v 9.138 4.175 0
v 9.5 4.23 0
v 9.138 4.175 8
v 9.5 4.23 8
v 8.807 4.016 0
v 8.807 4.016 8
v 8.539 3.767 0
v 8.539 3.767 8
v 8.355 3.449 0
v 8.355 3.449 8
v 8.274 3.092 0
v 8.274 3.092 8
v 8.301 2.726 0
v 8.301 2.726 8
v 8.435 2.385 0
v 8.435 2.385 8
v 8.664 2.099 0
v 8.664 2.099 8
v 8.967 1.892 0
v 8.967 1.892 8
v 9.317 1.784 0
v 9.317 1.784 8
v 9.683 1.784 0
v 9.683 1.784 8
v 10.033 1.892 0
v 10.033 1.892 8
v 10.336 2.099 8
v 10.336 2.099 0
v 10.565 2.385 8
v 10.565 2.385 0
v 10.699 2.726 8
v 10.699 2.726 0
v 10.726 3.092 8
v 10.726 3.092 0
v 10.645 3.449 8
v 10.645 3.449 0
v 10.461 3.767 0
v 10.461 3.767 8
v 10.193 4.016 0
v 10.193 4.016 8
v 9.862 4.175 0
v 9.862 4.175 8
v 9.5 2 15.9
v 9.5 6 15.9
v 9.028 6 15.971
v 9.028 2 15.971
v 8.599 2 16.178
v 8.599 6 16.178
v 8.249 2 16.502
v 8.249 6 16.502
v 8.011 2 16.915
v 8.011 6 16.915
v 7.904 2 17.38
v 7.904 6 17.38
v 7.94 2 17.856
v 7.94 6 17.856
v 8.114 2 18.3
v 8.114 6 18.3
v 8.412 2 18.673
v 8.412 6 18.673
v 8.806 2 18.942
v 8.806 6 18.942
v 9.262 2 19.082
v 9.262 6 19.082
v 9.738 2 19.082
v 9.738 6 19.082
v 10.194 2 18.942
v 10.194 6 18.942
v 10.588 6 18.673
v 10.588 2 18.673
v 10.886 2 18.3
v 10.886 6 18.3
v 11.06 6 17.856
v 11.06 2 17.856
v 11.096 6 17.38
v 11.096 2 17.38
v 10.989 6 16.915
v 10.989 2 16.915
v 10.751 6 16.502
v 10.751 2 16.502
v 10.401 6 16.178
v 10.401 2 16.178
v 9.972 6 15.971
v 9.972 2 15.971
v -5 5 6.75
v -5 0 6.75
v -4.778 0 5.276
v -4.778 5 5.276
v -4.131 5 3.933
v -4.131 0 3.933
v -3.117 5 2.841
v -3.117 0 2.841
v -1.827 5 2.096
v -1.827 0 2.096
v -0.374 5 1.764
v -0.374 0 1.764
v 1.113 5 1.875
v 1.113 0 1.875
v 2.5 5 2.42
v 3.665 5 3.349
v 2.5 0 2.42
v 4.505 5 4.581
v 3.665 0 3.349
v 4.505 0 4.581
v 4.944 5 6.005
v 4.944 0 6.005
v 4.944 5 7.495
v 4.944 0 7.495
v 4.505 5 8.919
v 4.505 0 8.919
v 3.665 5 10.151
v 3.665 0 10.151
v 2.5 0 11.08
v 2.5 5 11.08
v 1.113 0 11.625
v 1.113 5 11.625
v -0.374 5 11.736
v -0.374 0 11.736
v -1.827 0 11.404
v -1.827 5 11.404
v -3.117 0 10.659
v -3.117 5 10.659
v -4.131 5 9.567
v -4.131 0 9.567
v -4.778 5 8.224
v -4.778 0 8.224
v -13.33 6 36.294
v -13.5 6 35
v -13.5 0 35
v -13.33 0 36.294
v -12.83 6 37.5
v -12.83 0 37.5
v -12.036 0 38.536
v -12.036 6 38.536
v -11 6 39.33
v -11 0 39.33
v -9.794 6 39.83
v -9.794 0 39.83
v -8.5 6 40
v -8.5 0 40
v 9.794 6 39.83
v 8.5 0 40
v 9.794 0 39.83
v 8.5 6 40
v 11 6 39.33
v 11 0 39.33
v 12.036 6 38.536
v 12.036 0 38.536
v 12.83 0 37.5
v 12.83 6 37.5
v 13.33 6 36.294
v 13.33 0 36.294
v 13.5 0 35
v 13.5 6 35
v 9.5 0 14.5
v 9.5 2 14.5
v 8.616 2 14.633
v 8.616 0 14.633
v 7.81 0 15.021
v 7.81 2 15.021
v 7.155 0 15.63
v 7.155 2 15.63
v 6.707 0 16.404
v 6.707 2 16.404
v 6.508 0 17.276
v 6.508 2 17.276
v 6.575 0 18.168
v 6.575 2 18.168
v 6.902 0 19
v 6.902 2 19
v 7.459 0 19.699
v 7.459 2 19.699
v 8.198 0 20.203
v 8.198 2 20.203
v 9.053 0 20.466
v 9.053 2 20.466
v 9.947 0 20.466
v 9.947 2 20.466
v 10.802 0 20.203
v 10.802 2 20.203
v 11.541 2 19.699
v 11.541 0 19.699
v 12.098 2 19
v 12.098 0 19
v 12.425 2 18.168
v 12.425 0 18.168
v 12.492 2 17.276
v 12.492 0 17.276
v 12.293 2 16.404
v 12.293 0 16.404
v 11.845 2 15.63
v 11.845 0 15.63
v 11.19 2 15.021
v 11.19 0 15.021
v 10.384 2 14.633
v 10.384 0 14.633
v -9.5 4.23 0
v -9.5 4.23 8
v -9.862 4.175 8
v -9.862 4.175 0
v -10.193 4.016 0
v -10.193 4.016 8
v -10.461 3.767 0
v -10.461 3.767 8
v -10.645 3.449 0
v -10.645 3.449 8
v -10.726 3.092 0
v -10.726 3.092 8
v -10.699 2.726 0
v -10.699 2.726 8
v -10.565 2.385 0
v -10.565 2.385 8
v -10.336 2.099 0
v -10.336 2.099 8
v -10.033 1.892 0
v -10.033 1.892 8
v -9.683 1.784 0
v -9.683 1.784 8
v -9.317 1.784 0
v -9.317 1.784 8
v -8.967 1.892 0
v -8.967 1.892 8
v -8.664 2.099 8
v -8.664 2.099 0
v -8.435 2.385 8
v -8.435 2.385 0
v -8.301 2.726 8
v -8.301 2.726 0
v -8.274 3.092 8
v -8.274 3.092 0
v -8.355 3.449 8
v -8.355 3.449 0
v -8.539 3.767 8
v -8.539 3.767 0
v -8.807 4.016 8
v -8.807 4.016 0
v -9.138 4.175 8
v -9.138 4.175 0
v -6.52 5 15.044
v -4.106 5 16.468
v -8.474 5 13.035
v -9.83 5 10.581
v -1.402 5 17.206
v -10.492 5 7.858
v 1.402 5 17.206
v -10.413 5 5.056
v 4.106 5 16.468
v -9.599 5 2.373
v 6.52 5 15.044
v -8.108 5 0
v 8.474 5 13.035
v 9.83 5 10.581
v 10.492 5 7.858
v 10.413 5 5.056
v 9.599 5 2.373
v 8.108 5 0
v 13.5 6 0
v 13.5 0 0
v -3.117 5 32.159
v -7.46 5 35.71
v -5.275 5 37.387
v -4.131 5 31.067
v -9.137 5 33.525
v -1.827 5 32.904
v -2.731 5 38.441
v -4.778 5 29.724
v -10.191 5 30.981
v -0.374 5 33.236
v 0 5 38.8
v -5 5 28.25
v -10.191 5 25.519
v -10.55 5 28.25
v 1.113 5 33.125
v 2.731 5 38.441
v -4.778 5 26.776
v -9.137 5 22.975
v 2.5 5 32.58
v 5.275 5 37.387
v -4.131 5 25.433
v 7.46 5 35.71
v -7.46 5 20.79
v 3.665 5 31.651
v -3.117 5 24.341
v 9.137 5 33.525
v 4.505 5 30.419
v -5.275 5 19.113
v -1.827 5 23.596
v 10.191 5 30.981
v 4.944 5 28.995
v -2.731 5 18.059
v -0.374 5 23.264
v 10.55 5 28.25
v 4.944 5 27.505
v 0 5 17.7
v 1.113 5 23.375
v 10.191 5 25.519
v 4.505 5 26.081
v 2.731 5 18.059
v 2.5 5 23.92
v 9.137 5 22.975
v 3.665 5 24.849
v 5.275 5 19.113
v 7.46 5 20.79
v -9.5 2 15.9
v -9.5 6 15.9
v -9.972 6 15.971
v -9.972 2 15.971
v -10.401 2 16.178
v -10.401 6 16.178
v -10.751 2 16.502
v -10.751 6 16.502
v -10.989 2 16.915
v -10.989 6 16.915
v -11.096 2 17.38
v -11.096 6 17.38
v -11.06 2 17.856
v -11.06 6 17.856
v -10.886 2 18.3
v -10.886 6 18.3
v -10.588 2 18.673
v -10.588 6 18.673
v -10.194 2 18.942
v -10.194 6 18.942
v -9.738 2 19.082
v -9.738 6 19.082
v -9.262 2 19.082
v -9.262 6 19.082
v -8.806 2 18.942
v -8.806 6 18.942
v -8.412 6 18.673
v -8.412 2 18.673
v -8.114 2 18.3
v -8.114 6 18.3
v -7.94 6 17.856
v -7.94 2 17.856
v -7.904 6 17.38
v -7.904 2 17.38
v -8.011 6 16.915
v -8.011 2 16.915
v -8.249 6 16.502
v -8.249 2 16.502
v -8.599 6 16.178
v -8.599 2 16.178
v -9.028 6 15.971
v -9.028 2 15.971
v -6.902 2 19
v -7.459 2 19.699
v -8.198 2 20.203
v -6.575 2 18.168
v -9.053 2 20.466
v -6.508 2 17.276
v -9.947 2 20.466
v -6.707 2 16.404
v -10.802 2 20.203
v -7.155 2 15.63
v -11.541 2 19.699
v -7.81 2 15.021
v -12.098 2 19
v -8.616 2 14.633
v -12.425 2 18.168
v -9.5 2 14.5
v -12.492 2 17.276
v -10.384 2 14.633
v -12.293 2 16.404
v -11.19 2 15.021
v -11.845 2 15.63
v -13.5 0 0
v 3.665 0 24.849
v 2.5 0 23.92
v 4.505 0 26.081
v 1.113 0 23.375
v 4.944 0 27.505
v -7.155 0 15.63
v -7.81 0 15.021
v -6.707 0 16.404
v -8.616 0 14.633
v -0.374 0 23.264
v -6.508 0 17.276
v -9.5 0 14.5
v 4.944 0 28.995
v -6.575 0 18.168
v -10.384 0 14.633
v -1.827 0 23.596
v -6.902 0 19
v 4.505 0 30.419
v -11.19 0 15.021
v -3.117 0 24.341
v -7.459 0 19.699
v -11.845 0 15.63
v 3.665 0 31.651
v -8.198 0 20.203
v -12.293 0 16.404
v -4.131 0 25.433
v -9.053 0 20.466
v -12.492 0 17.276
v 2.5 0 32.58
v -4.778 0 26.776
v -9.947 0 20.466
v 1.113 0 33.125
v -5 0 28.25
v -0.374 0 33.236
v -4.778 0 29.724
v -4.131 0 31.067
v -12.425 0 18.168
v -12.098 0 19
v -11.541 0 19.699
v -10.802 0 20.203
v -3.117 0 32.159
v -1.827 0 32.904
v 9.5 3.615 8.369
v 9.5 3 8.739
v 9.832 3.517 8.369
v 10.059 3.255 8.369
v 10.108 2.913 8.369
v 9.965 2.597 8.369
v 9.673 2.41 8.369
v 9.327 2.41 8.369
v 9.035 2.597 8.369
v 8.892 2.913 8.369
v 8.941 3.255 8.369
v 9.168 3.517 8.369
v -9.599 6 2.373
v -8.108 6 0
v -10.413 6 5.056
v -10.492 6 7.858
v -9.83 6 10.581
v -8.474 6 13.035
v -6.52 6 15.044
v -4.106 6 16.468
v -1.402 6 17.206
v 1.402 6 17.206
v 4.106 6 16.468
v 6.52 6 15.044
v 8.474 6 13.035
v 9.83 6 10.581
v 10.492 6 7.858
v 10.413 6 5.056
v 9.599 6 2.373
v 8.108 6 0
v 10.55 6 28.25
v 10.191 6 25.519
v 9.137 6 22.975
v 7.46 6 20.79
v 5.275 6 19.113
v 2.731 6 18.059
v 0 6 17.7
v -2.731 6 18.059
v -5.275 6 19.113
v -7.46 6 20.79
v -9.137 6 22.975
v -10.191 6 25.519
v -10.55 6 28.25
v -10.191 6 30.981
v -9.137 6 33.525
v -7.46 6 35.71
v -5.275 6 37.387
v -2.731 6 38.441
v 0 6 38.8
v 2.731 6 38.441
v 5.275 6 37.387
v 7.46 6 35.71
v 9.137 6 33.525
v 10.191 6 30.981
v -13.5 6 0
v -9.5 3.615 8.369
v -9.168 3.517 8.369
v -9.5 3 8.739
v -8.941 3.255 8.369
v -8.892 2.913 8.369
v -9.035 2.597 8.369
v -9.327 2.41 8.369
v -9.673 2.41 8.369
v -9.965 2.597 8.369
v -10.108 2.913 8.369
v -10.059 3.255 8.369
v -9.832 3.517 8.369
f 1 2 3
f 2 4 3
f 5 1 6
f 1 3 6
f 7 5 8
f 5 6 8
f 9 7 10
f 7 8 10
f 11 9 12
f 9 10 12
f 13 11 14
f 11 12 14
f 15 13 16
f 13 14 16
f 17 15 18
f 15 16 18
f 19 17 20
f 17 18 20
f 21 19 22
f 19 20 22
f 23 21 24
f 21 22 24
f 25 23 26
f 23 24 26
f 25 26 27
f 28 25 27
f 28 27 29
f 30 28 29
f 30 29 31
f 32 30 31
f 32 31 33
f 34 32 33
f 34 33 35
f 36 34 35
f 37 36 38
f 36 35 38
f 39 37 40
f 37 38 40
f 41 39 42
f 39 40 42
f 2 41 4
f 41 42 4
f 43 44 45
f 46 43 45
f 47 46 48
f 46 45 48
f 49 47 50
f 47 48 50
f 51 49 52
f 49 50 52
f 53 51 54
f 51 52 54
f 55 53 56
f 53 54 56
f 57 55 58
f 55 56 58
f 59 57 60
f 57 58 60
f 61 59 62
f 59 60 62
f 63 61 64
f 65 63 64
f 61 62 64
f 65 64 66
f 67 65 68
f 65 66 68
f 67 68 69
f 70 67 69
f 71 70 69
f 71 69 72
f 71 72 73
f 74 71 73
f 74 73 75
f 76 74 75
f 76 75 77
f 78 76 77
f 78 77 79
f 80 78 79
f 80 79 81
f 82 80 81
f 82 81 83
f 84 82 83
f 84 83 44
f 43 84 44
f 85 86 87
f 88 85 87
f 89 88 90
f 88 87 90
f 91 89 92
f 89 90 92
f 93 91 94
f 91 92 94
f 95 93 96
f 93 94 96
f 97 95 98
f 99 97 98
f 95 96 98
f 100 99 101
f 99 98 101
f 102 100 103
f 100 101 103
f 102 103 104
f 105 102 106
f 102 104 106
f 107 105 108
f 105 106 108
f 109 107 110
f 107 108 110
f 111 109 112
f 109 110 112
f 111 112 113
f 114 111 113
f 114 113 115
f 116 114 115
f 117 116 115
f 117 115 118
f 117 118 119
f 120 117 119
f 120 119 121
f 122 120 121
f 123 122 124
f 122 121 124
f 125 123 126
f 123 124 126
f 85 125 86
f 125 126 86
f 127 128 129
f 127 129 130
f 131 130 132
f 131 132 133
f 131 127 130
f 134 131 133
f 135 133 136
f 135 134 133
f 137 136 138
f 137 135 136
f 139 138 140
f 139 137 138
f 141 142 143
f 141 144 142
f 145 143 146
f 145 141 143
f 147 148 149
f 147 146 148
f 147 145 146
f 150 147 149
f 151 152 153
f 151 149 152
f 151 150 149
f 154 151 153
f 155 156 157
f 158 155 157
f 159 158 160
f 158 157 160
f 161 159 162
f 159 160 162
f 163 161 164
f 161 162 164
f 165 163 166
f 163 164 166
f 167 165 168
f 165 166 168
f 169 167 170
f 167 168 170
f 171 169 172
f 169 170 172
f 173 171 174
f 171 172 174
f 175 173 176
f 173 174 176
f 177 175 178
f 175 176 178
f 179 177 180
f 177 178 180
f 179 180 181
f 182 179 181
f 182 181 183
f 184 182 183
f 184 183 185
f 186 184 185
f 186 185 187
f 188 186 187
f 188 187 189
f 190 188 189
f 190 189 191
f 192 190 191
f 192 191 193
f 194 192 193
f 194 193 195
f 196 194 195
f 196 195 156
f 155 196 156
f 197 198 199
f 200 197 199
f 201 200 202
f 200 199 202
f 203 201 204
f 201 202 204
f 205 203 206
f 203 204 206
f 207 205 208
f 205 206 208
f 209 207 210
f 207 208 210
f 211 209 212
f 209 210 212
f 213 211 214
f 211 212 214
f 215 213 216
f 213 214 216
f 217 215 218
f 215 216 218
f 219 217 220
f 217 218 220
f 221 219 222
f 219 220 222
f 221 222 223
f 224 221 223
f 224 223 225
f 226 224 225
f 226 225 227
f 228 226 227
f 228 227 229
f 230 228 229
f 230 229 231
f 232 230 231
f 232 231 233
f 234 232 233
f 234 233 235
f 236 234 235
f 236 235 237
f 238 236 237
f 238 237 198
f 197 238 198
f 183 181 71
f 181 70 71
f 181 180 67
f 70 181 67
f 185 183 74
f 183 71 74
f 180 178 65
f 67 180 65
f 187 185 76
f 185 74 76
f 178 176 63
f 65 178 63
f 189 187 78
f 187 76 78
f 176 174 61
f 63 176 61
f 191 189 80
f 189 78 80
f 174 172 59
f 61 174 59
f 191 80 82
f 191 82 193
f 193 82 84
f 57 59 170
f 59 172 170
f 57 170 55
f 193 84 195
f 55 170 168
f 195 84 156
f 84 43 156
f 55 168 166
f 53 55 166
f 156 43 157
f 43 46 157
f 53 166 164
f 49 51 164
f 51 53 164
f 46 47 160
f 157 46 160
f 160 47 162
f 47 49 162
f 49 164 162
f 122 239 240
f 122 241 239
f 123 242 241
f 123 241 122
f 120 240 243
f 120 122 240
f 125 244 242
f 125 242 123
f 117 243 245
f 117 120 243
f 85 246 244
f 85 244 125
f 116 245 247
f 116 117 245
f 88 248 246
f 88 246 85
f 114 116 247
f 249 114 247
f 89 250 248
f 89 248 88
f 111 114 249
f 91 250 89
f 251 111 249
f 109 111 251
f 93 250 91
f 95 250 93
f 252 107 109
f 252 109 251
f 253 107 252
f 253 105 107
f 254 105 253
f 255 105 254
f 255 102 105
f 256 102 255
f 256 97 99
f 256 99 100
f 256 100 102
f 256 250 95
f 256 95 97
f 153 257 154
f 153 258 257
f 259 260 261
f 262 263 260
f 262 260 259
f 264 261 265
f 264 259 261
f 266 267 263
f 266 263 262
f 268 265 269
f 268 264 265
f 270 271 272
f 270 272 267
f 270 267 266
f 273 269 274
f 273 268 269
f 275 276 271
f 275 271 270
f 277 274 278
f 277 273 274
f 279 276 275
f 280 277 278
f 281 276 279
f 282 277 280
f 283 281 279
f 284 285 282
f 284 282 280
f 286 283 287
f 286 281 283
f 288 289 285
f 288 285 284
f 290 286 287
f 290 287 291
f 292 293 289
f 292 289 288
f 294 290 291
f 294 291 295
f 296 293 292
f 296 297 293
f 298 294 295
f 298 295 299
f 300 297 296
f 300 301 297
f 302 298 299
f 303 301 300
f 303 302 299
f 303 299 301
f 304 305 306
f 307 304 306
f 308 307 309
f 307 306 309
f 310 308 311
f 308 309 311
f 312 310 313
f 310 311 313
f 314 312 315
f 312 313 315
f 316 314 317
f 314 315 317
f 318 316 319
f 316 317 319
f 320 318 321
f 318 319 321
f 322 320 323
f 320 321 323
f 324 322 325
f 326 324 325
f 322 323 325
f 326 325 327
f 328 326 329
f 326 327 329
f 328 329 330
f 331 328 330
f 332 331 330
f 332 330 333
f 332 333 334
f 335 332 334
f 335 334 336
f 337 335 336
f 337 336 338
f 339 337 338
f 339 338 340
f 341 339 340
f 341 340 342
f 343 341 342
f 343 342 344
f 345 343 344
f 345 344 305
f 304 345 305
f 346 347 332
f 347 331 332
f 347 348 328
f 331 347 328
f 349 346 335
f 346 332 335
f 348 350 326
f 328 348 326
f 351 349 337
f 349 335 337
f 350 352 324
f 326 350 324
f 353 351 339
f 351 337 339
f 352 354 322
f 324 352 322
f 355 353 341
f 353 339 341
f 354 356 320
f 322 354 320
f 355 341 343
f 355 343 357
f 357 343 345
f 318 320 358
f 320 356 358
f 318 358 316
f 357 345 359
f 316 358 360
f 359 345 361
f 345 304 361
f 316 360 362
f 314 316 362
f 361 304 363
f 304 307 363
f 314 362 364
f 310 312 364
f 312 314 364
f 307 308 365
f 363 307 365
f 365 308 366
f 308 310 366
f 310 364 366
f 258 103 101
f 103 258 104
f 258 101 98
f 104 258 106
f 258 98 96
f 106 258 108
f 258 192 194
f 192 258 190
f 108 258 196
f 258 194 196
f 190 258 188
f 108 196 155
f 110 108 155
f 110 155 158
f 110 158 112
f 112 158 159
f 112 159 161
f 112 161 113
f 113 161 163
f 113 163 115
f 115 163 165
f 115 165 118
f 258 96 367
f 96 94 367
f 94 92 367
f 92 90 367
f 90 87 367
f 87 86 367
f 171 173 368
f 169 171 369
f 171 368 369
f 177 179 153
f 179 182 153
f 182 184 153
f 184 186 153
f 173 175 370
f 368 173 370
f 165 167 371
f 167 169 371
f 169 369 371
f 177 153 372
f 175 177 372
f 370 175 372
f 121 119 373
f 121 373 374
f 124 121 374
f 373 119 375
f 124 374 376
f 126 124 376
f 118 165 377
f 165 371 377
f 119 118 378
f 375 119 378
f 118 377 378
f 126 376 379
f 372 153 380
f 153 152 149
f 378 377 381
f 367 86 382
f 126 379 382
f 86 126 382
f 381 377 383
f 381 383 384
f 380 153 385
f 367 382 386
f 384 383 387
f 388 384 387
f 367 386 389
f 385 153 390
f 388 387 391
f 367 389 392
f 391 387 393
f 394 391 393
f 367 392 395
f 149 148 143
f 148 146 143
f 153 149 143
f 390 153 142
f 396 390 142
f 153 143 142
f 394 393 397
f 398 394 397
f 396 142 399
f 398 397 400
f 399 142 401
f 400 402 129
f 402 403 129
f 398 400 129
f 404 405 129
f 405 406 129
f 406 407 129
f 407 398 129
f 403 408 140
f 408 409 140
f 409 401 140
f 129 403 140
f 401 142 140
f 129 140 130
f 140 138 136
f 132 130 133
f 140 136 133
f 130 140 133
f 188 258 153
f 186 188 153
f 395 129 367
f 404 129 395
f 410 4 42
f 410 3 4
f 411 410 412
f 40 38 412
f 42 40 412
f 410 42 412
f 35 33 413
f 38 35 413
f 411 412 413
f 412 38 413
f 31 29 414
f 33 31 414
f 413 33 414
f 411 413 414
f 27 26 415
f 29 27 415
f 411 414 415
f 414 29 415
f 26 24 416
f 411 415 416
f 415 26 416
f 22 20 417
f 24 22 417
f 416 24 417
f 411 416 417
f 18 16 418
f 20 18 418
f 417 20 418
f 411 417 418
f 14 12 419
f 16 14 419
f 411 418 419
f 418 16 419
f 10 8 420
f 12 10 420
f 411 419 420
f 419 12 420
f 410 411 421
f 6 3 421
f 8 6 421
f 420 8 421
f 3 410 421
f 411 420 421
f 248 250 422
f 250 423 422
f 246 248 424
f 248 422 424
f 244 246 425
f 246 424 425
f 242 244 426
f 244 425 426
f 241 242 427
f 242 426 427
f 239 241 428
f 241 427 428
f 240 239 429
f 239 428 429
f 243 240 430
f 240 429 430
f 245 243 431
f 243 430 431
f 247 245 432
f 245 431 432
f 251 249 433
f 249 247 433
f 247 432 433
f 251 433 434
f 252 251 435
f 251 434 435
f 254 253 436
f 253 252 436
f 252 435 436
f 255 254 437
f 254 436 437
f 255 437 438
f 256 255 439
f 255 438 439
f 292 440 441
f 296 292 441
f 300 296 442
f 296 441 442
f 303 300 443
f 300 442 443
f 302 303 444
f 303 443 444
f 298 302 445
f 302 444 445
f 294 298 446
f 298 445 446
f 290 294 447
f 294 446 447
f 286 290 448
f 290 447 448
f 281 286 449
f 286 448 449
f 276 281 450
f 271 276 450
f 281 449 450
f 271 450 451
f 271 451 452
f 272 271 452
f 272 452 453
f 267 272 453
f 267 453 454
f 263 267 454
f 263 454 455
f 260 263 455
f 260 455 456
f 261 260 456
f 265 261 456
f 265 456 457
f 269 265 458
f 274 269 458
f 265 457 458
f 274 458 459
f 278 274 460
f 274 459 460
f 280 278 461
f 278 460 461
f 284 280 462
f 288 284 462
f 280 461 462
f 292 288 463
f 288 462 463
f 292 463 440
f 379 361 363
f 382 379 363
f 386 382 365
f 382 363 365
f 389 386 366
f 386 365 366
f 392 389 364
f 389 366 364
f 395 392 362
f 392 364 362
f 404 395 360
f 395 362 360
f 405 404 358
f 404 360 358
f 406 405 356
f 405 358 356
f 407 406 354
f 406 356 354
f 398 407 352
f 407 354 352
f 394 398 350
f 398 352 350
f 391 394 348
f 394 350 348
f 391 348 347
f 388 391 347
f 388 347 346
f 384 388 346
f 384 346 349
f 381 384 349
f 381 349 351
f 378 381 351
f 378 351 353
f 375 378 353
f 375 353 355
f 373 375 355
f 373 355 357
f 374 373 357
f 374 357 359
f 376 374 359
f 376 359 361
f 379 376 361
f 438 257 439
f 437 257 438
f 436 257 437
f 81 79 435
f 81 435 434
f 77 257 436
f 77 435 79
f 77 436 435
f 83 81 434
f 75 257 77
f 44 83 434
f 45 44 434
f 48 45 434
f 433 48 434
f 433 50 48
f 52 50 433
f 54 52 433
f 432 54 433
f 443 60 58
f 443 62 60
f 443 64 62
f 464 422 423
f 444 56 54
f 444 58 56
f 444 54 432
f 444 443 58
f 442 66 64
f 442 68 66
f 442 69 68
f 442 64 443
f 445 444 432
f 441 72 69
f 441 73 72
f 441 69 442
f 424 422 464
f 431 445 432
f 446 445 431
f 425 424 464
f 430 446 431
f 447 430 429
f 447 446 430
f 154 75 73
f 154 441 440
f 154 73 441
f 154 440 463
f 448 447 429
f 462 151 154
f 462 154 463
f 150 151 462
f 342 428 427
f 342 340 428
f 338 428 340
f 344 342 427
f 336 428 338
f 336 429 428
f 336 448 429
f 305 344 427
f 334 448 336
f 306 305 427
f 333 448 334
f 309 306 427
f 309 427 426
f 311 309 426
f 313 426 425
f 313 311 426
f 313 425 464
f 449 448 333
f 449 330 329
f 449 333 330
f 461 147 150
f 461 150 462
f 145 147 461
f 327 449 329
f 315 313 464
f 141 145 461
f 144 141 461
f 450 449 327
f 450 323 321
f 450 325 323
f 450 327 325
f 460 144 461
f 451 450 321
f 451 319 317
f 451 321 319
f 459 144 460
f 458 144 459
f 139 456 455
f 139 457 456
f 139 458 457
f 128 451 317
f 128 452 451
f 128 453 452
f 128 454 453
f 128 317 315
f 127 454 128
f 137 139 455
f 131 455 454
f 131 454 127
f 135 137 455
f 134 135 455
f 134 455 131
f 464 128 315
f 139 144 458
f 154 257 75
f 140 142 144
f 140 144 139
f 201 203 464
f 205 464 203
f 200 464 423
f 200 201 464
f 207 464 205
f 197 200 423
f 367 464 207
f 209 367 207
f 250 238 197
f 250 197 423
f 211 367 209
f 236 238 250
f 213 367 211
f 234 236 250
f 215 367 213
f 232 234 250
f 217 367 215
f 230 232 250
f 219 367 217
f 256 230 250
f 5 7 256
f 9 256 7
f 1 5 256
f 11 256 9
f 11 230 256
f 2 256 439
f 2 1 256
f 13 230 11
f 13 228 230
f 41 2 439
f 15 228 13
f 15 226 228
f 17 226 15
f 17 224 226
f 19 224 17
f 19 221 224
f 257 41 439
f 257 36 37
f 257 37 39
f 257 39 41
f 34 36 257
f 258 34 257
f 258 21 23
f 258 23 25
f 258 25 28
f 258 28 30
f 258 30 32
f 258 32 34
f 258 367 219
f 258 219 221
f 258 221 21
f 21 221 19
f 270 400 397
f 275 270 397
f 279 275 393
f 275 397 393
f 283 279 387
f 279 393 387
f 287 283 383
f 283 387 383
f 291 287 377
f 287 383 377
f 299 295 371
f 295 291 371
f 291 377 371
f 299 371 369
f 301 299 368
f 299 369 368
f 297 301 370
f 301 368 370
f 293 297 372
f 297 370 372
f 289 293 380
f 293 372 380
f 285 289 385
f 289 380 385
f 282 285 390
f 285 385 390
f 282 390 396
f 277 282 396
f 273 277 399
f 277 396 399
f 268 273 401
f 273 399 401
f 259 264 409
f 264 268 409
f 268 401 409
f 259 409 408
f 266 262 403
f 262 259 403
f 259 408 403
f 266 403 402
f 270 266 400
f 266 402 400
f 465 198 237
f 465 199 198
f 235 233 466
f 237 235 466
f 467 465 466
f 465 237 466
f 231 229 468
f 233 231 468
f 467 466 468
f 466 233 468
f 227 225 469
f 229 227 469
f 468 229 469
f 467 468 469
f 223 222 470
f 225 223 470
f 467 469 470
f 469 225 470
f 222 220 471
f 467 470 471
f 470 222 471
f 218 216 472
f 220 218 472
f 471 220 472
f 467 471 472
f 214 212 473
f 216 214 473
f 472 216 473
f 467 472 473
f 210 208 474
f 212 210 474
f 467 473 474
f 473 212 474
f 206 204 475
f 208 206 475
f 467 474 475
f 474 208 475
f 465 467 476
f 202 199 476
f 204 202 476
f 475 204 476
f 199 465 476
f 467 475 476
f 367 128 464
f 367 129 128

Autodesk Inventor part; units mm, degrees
ref_plane "YZ Plane" through (0, 0, 0) normal (1, 0, 0) x (0, 1, 0)
ref_plane "XZ Plane" through (0, 0, 0) normal (0, 1, 0) x (-1, 0, 0)
ref_plane "XY Plane" through (0, 0, 0) normal (0, 0, 1) x (1, 0, 0)
sketch "Skizze1" plane through (0, 0, 0) normal (0, 1, 0) x (-1, 0, 0)
  line L0 (13.5, 0) -> (-13.5, 0)
  line L1 (-13.5, 0) -> (-13.5, 40)
  line L2 (-13.5, 40) -> (13.5, 40)
  line L3 (13.5, 40) -> (13.5, 0)
  line L4 (0, -12.8) -> (0, 48.8) projected
  circle A0 centre (0, 6.75) radius 5
  circle A1 centre (0, 28.25) radius 5
  circle A2 centre (0, 28.25) radius 10.75 construction
  circle A3 centre (0, 6.75) radius 10.75 construction
  line L5 (0, 6.75) -> (0, -4) construction
  point P0 (0, 0)
  dimension "d4" = 21.5
  dimension "d0" = 27
  dimension "d1" = 10
  dimension "d2" = 10
  dimension "d3" = 21.5
  dimension "d8" = 4
  dimension "d35" = 40
extrude "Extrusion1" add sketch "Skizze1" along normal blind 6 contours L0 L4 A0 A1 L2 L3 | L0 L1 L2 L4 A1 A0
sketch "Skizze2" plane through (13.5, 0, 0) normal (0, 0, -1) x (-1, 0, 0)
  line L0 (0, 0) -> (27, 0) projected
  line L1 (0, 6) -> (27, 6) projected
  line L2 (25.041, 3) -> (0, 3) construction
  line L3 (13.5, 0) -> (13.5, 6) construction
  line L4 (27, 0) -> (27, 6) projected
  line L5 (0, 0) -> (0, 6) projected
  point P0 (23, 3)
  point P1 (4, 3)
  dimension "d68" = 9.5
hole "Bohrung1" at (-9.5, 3, 0) at (9.5, 3, 0) direction (0, 0, 1) diameter 2.459 depth 8 tip angle 118 thread size "M3x0.5" class "6H" standard "ISO Metric profile"
sketch "Skizze5" plane through (0, 6, 0) normal (0, 1, 0) x (1, 0, 0)
  circle A0 centre (0, -28.25) radius 5 projected
  circle A1 centre (0, -28.25) radius 5 projected
  circle A2 centre (0, -6.75) radius 5 projected
  circle A3 centre (0, -6.75) radius 5 projected
  circle A4 centre (0, -28.25) radius 10.55
  circle A5 centre (0, -6.75) radius 10.55
  point P0 (0, 0)
  dimension "d44" = 21.1
extrude "Extrusion2" cut sketch "Skizze5" against normal blind 1
fillet "Fillet2" radius 5 2 edges at (-13.5, 3, 40) (13.5, 3, 40)
sketch "Sketch7" plane through (0, 0, 0) normal (0, -1, 0) x (1, 0, 0)
  arc A0 (13.5, 35) -> (8.5, 40) centre (8.5, 35) ccw construction
  line L0 (-8.5, 40) -> (8.5, 40) construction
  arc A1 (-8.5, 40) -> (-13.5, 35) centre (-8.5, 35) ccw construction
  line L1 (-13.5, 0) -> (-13.5, 35) construction
  line L2 (13.5, 0) -> (-13.5, 0) construction
  line L3 (13.5, 35) -> (13.5, 0) construction
  circle A2 centre (0, 28.25) radius 5 construction
  circle A3 centre (0, 6.75) radius 5 construction
  line L4 (0, 28.25) -> (0, 6.75) construction
  line L5 (-13.5, 0) -> (-13.5, 35) construction
  line L6 (-13.5, 17.5) -> (13.5, 17.5) construction
  line L7 (13.5, 35) -> (13.5, 0) construction
  point P0 (0, 0)
  point P1 (0, 17.5)
  point P2 (-9.5, 17.5)
  point P3 (9.5, 17.5)
  dimension "d66" = 9.5
  dimension "d67" = 9.5
hole "Hole5" at (-9.5, 0, 17.5) at (9.5, 0, 17.5) direction (0, 1, 0) diameter 3.2 depth 8 tip angle 118 counterbore diameter 6 counterbore depth 2
equation "\"d4\" = d3"
equation "\"d67\" = d66"
properties part number "kicker_base_v2" material "Steel, Carbon"
